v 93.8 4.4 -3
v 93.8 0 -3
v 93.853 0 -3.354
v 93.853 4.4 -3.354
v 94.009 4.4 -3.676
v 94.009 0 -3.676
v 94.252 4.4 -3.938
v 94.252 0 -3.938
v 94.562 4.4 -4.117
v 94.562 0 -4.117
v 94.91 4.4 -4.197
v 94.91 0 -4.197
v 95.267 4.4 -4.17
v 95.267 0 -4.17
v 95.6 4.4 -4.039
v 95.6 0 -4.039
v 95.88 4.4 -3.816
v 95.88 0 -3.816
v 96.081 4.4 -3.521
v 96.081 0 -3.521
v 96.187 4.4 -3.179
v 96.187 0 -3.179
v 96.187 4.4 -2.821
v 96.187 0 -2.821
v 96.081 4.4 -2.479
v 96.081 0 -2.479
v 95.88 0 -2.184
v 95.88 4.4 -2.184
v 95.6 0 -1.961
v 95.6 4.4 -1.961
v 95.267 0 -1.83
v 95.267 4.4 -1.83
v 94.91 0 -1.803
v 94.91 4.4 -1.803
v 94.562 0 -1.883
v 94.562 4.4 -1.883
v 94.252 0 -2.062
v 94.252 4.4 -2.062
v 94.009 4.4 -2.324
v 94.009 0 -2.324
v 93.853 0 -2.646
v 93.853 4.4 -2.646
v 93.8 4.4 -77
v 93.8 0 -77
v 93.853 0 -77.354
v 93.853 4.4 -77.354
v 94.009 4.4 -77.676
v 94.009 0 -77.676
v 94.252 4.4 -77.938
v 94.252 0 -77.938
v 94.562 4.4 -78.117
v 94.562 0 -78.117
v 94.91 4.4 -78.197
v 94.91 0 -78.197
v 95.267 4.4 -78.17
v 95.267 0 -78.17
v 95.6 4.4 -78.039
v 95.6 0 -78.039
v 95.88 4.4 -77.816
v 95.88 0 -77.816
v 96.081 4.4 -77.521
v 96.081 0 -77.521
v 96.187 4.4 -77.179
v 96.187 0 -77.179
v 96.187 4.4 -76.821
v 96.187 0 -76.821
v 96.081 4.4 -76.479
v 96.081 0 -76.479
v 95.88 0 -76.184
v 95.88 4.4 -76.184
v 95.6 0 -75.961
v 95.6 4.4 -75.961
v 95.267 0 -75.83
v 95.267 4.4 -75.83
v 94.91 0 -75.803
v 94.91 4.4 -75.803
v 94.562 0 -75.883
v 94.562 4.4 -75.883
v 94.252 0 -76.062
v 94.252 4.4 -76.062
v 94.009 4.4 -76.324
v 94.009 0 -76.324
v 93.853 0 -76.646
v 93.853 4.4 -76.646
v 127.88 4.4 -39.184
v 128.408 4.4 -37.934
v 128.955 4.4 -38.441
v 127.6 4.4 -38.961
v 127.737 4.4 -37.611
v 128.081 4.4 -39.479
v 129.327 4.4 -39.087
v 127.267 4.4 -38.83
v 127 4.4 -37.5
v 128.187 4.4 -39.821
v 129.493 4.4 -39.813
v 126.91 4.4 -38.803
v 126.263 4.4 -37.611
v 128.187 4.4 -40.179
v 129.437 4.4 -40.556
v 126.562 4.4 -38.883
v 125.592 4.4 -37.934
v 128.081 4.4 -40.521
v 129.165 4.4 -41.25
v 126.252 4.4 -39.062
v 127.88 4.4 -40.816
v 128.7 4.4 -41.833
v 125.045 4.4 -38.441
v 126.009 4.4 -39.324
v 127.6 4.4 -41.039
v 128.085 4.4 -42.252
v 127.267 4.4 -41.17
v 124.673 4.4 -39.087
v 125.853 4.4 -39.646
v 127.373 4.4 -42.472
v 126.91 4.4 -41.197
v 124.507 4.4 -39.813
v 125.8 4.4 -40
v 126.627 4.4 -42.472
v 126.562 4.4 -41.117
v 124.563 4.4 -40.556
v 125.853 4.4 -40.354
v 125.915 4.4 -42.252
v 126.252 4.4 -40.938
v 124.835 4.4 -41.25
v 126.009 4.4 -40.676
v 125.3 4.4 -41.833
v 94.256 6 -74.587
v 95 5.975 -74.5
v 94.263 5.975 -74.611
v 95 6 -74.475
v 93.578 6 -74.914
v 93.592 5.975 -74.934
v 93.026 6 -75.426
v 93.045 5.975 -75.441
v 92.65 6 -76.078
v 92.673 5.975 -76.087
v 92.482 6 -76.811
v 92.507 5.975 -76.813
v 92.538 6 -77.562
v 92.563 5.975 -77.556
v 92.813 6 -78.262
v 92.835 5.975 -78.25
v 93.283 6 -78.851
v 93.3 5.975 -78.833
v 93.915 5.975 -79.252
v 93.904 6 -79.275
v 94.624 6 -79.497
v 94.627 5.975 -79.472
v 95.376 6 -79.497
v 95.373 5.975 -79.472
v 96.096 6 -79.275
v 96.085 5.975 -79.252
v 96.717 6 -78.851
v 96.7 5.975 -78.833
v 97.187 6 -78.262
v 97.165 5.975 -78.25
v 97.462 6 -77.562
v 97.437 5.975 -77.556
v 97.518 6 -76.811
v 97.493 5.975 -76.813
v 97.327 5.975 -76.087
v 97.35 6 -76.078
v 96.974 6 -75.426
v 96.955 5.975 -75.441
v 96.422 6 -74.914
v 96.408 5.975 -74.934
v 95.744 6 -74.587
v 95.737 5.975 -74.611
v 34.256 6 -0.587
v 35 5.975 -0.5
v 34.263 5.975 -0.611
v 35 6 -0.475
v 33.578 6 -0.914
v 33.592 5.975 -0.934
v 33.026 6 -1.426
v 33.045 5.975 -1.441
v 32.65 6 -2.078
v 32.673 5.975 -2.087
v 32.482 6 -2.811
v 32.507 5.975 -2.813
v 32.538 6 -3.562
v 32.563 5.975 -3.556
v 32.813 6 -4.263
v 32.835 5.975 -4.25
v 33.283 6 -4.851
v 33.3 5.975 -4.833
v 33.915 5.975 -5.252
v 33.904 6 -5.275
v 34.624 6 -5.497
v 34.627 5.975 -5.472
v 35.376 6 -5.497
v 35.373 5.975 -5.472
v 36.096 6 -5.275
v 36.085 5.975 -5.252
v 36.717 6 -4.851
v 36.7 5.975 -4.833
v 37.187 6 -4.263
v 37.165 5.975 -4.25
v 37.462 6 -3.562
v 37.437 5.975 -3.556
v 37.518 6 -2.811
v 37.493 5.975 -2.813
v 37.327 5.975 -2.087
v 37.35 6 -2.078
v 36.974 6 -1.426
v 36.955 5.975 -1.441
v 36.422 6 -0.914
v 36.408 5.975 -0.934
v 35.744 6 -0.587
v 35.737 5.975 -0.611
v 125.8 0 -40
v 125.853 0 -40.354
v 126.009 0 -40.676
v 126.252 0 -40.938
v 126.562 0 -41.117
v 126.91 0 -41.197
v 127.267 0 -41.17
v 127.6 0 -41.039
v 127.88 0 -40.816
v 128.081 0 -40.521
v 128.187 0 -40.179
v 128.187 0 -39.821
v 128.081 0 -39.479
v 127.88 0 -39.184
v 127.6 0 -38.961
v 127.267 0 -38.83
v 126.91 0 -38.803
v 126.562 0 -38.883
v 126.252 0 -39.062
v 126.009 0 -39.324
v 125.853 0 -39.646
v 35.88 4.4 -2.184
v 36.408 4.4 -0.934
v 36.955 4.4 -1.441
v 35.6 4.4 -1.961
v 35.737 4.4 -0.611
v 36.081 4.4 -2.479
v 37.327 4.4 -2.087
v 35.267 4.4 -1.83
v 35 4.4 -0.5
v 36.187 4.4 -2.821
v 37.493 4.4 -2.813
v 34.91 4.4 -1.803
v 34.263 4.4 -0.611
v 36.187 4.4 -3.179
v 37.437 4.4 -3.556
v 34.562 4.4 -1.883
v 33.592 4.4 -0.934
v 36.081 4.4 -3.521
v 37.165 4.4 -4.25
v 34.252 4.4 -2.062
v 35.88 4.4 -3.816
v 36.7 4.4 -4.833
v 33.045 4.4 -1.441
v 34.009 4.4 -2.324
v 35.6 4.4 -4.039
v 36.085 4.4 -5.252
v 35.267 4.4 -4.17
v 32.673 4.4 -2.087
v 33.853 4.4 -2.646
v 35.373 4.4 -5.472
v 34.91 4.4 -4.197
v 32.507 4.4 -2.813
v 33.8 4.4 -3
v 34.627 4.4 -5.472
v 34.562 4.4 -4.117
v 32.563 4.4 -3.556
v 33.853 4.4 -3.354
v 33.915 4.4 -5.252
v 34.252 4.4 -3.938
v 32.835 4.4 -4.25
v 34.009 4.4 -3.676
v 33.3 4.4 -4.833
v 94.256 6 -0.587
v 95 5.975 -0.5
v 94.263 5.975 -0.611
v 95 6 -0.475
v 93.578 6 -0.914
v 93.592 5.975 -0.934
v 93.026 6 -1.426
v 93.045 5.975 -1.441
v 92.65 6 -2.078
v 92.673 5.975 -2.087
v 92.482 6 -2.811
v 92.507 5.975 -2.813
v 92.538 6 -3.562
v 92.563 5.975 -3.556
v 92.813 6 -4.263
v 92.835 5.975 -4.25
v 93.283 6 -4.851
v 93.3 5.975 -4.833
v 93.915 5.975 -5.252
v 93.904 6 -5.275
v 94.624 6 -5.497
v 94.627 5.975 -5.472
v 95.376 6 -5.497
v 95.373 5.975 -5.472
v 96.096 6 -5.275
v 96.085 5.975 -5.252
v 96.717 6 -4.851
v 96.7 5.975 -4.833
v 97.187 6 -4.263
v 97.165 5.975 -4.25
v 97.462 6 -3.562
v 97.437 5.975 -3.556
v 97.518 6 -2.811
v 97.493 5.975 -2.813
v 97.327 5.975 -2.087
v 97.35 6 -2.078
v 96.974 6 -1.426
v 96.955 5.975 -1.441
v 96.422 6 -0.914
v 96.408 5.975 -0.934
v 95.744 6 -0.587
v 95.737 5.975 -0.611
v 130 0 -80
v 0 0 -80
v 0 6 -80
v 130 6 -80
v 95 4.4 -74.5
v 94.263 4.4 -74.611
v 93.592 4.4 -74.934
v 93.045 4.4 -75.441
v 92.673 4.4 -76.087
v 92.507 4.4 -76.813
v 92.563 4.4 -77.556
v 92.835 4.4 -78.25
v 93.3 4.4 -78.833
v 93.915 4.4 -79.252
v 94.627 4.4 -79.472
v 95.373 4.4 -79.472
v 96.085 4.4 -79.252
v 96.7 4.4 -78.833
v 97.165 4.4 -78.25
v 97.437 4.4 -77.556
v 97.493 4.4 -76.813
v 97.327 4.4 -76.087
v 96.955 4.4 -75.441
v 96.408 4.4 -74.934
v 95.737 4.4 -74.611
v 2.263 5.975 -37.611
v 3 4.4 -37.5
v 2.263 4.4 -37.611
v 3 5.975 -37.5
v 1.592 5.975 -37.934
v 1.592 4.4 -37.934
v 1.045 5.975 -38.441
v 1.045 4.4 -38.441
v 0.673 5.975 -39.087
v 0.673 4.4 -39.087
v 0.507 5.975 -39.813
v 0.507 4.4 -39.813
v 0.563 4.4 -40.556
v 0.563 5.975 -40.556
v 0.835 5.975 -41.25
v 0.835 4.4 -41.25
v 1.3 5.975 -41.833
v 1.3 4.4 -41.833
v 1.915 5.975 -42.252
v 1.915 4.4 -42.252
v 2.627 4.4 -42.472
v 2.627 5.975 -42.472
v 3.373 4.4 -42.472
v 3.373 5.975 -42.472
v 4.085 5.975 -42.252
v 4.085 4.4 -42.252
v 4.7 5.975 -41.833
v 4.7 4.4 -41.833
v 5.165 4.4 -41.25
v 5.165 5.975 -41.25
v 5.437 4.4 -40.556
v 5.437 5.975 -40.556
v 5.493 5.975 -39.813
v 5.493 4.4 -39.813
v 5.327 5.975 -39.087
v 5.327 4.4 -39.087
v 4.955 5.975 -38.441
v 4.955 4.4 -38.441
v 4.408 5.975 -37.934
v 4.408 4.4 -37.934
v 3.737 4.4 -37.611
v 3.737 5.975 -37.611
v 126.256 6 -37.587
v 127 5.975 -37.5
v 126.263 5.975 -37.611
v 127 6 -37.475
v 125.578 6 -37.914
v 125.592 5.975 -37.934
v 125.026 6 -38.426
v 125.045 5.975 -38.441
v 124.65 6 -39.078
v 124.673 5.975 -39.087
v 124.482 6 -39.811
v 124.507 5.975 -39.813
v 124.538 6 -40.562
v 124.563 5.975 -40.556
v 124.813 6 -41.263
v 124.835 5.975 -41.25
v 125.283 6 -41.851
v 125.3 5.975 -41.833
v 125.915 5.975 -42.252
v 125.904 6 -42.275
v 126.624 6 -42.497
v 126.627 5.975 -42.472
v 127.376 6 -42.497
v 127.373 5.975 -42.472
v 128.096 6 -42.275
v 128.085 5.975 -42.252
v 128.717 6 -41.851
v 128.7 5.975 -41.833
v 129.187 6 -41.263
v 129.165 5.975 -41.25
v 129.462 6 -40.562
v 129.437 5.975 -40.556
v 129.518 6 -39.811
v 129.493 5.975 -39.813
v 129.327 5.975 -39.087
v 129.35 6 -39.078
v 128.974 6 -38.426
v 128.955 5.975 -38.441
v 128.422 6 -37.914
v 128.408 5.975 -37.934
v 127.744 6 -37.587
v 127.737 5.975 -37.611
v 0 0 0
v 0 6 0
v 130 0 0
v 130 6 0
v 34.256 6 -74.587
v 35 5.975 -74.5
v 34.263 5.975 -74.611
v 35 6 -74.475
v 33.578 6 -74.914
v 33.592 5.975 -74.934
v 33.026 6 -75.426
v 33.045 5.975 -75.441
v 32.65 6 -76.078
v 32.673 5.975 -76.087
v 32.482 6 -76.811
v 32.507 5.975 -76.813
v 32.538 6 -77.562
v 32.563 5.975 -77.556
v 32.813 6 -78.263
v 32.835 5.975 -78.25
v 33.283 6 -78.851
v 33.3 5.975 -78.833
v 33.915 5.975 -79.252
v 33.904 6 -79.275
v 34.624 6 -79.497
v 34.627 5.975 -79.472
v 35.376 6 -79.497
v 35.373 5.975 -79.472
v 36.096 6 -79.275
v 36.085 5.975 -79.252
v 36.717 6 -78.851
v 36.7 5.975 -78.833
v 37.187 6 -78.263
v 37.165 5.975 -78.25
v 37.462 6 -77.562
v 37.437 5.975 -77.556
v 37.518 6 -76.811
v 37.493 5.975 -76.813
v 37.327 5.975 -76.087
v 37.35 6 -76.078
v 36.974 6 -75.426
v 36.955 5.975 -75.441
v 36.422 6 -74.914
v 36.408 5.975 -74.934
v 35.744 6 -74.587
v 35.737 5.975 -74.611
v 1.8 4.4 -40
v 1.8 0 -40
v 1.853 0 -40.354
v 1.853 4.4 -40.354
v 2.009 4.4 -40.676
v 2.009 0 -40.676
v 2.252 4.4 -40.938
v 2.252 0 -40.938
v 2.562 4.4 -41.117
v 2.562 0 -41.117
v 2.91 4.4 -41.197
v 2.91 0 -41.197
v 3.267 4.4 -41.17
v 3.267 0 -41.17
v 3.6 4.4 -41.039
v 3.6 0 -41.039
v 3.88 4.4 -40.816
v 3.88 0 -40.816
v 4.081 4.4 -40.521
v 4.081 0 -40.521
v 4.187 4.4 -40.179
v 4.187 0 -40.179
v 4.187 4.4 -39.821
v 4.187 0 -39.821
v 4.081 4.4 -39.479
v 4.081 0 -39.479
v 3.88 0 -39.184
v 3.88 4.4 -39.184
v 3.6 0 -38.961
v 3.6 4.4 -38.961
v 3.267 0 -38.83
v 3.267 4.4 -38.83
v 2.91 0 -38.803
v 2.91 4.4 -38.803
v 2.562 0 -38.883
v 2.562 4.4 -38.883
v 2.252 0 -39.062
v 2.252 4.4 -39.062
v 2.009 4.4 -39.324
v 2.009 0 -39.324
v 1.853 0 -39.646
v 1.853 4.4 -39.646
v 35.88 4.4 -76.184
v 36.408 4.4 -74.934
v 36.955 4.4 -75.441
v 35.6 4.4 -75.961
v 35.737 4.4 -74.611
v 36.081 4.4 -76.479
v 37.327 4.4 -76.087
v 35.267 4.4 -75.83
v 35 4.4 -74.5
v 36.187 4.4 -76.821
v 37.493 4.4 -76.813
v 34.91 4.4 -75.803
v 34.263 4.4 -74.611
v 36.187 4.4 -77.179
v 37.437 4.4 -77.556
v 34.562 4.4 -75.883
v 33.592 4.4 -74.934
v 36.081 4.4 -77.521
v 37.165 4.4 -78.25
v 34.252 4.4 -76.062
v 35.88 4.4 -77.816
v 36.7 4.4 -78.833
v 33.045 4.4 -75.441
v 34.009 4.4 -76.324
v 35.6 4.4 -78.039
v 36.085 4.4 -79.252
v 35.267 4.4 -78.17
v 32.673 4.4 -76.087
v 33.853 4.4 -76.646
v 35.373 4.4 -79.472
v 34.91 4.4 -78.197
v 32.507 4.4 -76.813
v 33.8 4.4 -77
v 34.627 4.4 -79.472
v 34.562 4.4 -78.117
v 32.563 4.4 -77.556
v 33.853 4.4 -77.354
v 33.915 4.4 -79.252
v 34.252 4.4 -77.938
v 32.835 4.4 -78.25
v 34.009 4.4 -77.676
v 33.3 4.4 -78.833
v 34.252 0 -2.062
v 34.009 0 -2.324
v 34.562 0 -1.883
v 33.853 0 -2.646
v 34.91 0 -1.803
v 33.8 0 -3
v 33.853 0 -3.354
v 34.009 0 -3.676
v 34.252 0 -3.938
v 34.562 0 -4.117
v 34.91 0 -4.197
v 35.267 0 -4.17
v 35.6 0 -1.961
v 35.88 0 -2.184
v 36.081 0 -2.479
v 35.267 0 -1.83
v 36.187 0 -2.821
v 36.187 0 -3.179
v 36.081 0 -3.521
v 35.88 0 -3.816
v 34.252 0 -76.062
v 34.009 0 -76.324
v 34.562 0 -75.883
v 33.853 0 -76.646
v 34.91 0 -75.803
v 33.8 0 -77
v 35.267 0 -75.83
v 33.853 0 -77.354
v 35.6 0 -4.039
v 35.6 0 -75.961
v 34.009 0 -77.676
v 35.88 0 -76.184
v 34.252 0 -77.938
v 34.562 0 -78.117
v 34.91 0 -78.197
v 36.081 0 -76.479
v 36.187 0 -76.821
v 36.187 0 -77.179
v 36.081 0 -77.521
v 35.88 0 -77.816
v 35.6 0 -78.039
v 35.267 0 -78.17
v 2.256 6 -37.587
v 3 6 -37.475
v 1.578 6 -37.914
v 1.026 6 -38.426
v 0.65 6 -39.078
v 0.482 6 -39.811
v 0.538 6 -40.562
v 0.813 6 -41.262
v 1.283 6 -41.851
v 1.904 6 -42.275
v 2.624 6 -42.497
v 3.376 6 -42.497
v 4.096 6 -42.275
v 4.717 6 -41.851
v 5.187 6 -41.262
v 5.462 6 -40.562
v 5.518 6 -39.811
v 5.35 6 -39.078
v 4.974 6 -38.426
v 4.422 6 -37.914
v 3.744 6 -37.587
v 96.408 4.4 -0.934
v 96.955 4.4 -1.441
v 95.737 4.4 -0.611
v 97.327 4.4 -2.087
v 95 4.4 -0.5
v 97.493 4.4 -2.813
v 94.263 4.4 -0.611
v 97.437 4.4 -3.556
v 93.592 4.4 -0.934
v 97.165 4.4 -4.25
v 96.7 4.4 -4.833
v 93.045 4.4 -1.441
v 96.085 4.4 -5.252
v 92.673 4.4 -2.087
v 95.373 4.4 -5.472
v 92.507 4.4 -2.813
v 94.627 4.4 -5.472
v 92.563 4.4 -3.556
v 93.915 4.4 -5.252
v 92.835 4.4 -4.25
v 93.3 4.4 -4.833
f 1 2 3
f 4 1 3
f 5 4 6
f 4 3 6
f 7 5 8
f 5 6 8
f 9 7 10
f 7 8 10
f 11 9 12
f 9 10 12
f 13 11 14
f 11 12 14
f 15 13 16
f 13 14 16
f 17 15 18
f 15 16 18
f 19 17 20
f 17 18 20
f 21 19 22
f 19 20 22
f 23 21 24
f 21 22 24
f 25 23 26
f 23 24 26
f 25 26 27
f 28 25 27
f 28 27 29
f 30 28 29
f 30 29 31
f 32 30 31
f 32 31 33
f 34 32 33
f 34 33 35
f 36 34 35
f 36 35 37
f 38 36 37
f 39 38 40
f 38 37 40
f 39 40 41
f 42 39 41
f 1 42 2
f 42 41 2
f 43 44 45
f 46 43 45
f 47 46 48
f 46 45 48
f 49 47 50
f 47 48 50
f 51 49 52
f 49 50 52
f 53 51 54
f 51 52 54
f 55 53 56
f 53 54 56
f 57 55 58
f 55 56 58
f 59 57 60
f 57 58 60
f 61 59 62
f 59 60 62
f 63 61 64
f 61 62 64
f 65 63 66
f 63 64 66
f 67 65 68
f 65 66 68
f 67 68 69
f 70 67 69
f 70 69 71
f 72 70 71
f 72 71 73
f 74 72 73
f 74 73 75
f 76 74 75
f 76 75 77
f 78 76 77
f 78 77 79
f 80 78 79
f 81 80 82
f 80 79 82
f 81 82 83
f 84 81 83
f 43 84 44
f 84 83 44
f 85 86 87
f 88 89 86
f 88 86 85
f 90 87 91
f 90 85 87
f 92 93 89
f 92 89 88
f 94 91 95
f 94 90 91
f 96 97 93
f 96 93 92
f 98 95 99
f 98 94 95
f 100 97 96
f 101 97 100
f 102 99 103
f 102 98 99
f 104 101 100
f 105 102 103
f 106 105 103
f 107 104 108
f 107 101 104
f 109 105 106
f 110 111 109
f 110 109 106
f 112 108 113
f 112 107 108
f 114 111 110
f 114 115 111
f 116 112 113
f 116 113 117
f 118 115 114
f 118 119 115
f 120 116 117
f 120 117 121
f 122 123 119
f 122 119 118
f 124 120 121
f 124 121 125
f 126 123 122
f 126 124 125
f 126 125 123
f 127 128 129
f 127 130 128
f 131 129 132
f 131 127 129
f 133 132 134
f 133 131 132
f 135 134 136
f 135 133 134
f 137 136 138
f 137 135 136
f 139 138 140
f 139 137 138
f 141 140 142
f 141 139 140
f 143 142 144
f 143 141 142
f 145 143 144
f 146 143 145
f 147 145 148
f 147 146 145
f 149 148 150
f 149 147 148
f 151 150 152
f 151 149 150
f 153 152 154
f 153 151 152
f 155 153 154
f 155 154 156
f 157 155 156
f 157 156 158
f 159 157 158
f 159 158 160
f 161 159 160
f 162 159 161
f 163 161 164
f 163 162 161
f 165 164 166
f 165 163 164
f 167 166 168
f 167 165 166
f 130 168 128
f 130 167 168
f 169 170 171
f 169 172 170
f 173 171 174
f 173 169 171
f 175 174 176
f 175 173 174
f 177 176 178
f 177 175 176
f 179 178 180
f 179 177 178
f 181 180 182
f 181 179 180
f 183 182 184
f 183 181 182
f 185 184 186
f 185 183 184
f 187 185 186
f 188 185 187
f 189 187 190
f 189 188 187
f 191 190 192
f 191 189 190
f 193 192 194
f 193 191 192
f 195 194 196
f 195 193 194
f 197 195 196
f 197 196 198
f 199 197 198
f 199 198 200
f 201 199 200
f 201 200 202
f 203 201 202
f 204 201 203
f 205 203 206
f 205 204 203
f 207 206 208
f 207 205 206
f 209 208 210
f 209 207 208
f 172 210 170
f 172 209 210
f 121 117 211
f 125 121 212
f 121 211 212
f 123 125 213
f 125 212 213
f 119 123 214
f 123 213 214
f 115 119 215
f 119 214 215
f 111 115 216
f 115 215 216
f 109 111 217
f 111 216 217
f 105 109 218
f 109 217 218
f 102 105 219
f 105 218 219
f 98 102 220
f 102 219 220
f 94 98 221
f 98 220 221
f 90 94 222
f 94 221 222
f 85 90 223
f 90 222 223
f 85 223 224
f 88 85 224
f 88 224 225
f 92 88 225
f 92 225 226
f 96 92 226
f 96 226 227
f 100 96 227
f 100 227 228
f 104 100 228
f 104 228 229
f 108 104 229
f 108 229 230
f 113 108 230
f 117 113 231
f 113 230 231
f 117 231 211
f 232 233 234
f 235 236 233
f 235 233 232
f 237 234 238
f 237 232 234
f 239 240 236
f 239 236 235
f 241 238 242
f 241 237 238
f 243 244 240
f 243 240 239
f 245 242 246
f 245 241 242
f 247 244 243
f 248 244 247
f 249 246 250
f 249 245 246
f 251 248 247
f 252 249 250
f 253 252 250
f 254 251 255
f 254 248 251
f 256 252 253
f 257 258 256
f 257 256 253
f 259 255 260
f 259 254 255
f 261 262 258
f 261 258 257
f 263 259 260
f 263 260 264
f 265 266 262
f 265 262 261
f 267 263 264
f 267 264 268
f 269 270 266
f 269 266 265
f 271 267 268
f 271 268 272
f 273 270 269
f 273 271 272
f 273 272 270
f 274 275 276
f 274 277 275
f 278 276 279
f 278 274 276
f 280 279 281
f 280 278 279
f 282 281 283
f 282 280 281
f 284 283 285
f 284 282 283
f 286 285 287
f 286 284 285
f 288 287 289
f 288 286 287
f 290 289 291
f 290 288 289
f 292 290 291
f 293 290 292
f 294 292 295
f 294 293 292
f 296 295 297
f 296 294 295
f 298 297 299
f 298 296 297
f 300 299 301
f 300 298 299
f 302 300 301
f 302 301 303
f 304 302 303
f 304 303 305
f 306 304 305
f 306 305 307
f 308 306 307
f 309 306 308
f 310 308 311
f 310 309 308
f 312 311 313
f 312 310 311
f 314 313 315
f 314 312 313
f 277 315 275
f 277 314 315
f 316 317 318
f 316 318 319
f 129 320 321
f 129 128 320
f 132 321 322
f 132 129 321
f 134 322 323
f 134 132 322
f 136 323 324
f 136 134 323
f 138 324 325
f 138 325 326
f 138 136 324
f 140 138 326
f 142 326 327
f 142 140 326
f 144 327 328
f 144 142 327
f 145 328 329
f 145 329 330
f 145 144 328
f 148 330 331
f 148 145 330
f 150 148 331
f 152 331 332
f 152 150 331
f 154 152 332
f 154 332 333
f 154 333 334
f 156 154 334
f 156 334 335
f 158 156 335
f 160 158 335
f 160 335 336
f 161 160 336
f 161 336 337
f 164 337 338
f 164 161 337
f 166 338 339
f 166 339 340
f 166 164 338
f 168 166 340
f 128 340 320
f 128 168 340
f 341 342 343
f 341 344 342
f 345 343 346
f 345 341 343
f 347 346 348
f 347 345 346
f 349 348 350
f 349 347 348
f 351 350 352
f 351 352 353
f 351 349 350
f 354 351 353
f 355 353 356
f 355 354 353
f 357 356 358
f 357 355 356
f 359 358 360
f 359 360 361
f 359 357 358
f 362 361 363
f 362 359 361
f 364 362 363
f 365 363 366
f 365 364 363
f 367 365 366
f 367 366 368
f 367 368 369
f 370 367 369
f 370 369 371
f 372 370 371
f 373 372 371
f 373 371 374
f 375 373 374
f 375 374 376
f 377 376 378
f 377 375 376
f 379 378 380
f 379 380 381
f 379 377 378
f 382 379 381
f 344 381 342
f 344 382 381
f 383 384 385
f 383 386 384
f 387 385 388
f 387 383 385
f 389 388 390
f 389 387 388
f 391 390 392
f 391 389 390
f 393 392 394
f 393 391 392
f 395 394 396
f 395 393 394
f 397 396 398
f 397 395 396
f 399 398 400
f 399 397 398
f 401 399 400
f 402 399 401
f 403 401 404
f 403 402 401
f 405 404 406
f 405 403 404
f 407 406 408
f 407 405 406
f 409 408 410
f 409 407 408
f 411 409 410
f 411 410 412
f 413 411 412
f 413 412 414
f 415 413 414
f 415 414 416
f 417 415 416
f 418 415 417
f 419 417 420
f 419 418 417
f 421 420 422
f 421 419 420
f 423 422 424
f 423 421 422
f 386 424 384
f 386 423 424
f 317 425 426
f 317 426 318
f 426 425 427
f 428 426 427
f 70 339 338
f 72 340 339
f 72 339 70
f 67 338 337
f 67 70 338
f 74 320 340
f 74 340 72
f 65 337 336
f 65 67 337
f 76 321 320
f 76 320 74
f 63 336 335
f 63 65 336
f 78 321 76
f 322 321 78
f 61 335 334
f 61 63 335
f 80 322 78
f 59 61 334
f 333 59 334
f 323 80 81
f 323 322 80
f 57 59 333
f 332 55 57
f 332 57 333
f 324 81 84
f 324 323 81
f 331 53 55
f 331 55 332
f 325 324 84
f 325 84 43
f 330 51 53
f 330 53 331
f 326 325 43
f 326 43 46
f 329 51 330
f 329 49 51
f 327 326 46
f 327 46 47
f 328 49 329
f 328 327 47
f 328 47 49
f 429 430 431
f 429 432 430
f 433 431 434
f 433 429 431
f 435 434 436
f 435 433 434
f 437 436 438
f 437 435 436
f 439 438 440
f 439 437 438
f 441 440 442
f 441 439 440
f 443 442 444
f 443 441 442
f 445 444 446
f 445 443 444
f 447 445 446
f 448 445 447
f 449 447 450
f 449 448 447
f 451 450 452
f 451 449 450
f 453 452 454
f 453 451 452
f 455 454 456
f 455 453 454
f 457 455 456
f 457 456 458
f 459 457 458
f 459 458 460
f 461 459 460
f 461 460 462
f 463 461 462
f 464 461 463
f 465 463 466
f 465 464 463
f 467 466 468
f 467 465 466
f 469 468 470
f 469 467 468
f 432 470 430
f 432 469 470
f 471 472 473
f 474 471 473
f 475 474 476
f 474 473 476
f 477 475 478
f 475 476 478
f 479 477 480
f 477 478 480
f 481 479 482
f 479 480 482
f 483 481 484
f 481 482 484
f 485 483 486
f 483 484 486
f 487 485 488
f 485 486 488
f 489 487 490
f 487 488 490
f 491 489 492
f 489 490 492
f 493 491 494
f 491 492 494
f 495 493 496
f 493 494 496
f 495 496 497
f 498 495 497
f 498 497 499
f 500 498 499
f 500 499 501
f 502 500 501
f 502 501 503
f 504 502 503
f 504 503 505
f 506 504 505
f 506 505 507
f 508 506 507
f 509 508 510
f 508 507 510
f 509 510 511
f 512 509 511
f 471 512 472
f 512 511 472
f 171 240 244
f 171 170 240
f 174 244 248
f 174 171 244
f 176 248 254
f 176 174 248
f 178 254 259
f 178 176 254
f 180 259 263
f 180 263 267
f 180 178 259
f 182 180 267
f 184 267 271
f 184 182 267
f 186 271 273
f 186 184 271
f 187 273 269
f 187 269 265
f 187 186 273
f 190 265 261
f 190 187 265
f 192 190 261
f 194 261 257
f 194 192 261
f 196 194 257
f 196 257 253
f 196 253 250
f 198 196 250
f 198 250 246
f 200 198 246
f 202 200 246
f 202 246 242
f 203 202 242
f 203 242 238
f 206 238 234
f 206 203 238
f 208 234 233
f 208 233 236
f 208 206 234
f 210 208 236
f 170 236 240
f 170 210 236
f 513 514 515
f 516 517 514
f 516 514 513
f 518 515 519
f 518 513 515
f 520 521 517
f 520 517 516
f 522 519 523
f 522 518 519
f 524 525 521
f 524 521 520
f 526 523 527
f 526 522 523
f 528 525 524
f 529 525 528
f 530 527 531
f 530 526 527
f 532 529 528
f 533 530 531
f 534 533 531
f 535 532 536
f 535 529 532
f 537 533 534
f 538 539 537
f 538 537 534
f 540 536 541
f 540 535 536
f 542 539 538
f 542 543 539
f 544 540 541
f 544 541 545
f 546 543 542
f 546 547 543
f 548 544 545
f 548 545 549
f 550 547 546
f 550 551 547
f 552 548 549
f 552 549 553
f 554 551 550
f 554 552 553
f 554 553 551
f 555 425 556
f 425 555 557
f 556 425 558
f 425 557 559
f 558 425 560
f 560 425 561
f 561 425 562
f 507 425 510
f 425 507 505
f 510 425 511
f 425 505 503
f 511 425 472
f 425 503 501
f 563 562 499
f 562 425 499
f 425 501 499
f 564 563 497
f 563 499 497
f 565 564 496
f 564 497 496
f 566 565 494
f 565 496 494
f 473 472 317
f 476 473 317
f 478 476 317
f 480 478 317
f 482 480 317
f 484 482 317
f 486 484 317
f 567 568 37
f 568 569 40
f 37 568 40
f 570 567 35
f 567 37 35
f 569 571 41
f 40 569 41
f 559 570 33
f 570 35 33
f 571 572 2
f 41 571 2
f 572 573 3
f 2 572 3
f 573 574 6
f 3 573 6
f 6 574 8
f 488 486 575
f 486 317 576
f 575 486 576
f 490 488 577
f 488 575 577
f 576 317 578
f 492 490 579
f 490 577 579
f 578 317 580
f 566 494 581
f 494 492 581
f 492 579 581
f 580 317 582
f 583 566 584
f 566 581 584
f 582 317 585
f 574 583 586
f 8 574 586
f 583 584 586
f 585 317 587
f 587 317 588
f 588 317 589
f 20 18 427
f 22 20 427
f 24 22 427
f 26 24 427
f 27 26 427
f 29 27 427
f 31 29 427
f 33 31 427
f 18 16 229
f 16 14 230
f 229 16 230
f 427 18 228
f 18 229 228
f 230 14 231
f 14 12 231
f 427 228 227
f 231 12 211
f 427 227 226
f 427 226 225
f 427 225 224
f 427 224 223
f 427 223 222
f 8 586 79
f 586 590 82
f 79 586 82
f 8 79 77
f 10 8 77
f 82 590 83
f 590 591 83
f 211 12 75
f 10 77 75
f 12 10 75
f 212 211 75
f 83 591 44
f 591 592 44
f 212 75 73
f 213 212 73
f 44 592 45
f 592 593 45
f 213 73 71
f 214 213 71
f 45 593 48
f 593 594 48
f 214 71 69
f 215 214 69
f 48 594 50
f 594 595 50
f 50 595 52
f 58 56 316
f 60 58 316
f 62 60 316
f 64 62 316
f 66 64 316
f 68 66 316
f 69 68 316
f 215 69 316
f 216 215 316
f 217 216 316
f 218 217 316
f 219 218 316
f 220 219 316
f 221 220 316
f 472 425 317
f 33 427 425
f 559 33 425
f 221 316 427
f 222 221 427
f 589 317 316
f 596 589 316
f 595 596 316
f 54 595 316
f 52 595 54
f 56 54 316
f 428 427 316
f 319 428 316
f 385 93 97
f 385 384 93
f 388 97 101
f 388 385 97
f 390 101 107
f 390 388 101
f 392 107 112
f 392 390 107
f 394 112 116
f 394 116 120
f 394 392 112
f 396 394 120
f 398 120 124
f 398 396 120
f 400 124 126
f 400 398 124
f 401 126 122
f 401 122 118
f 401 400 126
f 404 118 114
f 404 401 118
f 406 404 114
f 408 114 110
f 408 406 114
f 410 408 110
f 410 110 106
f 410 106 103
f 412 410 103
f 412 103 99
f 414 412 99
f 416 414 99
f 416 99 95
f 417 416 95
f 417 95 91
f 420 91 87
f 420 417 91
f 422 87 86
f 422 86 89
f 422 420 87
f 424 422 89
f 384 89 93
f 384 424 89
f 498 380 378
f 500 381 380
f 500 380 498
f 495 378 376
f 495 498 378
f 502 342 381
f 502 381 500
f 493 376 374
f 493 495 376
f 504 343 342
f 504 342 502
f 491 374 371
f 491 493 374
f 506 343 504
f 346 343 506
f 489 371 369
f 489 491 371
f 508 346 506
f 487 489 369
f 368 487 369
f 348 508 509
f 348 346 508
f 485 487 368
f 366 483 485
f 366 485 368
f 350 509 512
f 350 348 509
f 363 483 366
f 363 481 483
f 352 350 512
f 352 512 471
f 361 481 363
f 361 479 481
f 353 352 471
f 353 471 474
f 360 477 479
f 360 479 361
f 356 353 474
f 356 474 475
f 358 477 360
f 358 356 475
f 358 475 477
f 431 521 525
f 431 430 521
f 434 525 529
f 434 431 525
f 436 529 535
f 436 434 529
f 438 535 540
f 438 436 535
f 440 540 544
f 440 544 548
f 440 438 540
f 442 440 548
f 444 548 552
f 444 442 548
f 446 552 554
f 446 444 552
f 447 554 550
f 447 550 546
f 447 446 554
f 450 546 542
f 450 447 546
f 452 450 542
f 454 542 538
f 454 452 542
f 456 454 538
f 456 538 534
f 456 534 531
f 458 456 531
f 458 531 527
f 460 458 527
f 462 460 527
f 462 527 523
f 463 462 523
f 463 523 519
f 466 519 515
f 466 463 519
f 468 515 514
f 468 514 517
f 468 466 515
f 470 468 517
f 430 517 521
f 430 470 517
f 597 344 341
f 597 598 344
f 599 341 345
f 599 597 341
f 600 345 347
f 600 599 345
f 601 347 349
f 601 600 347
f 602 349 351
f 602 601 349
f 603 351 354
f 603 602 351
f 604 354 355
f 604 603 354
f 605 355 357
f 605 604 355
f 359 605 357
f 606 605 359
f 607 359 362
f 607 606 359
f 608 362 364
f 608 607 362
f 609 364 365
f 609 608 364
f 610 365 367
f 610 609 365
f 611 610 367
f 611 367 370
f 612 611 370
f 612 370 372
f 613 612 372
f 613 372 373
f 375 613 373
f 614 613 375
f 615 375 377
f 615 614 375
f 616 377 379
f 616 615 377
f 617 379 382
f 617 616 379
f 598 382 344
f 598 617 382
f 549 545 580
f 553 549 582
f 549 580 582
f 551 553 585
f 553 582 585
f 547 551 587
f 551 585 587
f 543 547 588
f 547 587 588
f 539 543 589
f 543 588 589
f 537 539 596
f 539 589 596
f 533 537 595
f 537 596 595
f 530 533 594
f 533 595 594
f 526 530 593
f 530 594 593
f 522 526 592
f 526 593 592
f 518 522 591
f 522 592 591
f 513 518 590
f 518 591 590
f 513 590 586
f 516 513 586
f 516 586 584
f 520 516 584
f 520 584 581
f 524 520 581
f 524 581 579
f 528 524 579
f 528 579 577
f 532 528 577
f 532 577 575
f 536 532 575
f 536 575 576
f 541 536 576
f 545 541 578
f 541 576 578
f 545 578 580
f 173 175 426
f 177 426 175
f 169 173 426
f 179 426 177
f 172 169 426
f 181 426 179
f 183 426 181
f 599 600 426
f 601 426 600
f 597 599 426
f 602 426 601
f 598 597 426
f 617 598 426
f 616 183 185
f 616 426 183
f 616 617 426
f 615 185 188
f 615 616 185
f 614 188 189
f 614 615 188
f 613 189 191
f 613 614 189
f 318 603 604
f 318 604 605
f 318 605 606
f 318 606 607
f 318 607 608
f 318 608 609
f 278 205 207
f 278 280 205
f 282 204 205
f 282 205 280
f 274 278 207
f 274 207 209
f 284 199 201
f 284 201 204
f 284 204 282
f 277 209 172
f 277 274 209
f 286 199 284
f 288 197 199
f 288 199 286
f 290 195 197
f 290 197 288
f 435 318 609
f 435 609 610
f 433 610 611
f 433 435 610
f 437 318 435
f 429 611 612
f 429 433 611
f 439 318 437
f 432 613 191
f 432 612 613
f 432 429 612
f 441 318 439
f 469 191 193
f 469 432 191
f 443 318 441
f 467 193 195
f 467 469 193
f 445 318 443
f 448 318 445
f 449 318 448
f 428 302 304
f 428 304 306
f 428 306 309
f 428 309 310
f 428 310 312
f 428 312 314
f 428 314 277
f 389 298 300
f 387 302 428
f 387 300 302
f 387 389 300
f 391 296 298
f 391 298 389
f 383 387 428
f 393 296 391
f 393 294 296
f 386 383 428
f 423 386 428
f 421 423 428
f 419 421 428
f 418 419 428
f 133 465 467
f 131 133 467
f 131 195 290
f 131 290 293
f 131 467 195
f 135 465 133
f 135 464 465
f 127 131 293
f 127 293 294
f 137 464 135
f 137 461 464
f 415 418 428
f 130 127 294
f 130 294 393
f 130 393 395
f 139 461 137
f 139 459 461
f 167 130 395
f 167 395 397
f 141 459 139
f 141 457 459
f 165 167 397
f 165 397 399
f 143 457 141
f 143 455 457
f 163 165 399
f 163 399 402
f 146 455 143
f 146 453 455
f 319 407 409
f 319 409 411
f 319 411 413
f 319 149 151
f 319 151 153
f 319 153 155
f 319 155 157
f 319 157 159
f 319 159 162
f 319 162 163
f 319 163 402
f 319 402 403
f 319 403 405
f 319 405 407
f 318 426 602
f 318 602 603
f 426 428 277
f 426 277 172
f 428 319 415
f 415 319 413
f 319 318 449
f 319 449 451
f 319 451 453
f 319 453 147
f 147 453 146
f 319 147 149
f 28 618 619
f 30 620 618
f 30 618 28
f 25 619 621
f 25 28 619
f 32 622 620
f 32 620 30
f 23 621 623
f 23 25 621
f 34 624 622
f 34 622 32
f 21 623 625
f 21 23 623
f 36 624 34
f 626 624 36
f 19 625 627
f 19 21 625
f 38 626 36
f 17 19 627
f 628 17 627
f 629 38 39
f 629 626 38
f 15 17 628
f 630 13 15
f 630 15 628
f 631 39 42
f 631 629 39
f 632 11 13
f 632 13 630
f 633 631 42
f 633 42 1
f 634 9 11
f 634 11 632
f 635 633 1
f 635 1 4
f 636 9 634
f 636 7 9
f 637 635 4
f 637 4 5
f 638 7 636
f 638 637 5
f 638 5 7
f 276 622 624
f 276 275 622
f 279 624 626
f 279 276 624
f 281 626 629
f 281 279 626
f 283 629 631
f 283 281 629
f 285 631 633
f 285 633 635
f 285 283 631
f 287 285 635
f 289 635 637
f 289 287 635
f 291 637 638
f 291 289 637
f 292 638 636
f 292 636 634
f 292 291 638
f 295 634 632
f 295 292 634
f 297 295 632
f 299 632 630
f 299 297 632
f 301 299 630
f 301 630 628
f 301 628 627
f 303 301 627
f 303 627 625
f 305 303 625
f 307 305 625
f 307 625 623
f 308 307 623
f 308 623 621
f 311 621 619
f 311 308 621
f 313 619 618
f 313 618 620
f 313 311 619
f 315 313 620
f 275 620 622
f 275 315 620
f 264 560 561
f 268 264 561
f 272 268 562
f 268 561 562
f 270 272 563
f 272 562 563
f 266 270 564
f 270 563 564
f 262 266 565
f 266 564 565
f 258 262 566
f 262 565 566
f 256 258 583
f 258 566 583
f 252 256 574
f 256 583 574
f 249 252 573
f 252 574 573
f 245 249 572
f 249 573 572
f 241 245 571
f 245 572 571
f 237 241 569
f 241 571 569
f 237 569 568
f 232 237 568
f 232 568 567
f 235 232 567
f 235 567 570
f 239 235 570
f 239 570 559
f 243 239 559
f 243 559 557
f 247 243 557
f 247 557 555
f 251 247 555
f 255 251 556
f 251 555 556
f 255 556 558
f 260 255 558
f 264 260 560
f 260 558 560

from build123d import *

# Parameters (mm, degrees)
SKIZZE1_W                                    = 130
SKIZZE1_H                                    = 80
AUFSATZ_LINEAR_AUSTRAGEN1_DEPTH              = 6
F_2_4_2_4_DURCHMESSER_BOHRUNG1_D             = 2.4
F_2_4_2_4_DURCHMESSER_BOHRUNG1_DEPTH         = 10
F_2_4_2_4_DURCHMESSER_BOHRUNG1_CSINK_D       = 2.45
F_2_4_2_4_DURCHMESSER_BOHRUNG1_CSINK_ANGLE   = 90
F_2_4_2_4_DURCHMESSER_BOHRUNG1_TIP           = 0.721032743
STIRNSENKUNG_F_R_M2_FLACHKOPFSCHRAUB_2_COUNT = 2
STIRNSENKUNG_F_R_M2_FLACHKOPFSCHRAUB_2_PITCH = 48.918299235
STIRNSENKUNG_F_R_M2_FLACHKOPFSCHRAUB_3_COUNT = 2
STIRNSENKUNG_F_R_M2_FLACHKOPFSCHRAUB_3_PITCH = 74
STIRNSENKUNG_F_R_M2_FLACHKOPFSCHRAUB_4_COUNT = 2
STIRNSENKUNG_F_R_M2_FLACHKOPFSCHRAUB_4_PITCH = 95.268042911
STIRNSENKUNG_F_R_M2_FLACHKOPFSCHRAUB_5_COUNT = 2
STIRNSENKUNG_F_R_M2_FLACHKOPFSCHRAUB_5_PITCH = 99.161484458
STIRNSENKUNG_F_R_M2_FLACHKOPFSCHRAUB_6_COUNT = 2
STIRNSENKUNG_F_R_M2_FLACHKOPFSCHRAUB_6_PITCH = 60


with BuildPart() as part:
    # Skizze1 → Aufsatz-Linear austragen1 (new body)
    with BuildSketch(Plane(origin=(0, 0, 0), x_dir=(1, 0, 0), z_dir=(0, 1, 0))):
        with Locations((65, 40)):
            Rectangle(SKIZZE1_W, SKIZZE1_H)
    extrude(amount=AUFSATZ_LINEAR_AUSTRAGEN1_DEPTH)

    # Ø2.4 (2.4) Durchmesser Bohrung1
    with Locations(Plane(origin=(0, 6, 0), x_dir=(1, 0, 0), z_dir=(0, 1, 0))):
        with Locations((35, 77), (95, 77), (127, 40), (95, 3), (35, 3), (3, 40), (133.088689194, 32.803420387)):
            CounterSinkHole(F_2_4_2_4_DURCHMESSER_BOHRUNG1_D / 2, F_2_4_2_4_DURCHMESSER_BOHRUNG1_CSINK_D / 2, depth=F_2_4_2_4_DURCHMESSER_BOHRUNG1_DEPTH, counter_sink_angle=F_2_4_2_4_DURCHMESSER_BOHRUNG1_CSINK_ANGLE)
            with Locations((0, 0, -(F_2_4_2_4_DURCHMESSER_BOHRUNG1_DEPTH + F_2_4_2_4_DURCHMESSER_BOHRUNG1_TIP / 2))):  # 118° drill point
                Cone(0, F_2_4_2_4_DURCHMESSER_BOHRUNG1_D / 2, F_2_4_2_4_DURCHMESSER_BOHRUNG1_TIP, mode=Mode.SUBTRACT)

    # Skizze7 → Stirnsenkung für M2 Flachkopfschraube mit Schlitz1 (revolve, cut)
    with BuildSketch(Plane(origin=(95, 6, -3), x_dir=(0, 0, 1), z_dir=(1, 0, 0))):
        Polygon((0, 0), (0, 2.721032743), (1.2, 2), (1.2, 1.6), (2.5, 1.6), (2.5, 0.025), (2.525, 0), align=None)
    stirnsenkung_f_r_m2_flachkopfschraube_mi = revolve(axis=Axis((95, 12.35, -3), (0, -1, 0)), mode=Mode.SUBTRACT)

    # Stirnsenkung f_r M2 Flachkopfschraub 2: Stirnsenkung für M2 Flachkopfschraube mit Schlitz1 ×2
    with Locations(*[Vector(0.6541519329315842, 0, -0.7563631724521444) * (i * STIRNSENKUNG_F_R_M2_FLACHKOPFSCHRAUB_2_PITCH) for i in range(1, STIRNSENKUNG_F_R_M2_FLACHKOPFSCHRAUB_2_COUNT)]):
        add(stirnsenkung_f_r_m2_flachkopfschraube_mi, mode=Mode.SUBTRACT)

    # Stirnsenkung f_r M2 Flachkopfschraub 3: Stirnsenkung für M2 Flachkopfschraube mit Schlitz1 ×2
    with Locations(*[(0, 0, -i * STIRNSENKUNG_F_R_M2_FLACHKOPFSCHRAUB_3_PITCH) for i in range(1, STIRNSENKUNG_F_R_M2_FLACHKOPFSCHRAUB_3_COUNT)]):
        add(stirnsenkung_f_r_m2_flachkopfschraube_mi, mode=Mode.SUBTRACT)

    # Stirnsenkung f_r M2 Flachkopfschraub 4: Stirnsenkung für M2 Flachkopfschraube mit Schlitz1 ×2
    with Locations(*[Vector(-0.6298019584212194, 0, -0.7767557487195037) * (i * STIRNSENKUNG_F_R_M2_FLACHKOPFSCHRAUB_4_PITCH) for i in range(1, STIRNSENKUNG_F_R_M2_FLACHKOPFSCHRAUB_4_COUNT)]):
        add(stirnsenkung_f_r_m2_flachkopfschraube_mi, mode=Mode.SUBTRACT)

    # Stirnsenkung f_r M2 Flachkopfschraub 5: Stirnsenkung für M2 Flachkopfschraube mit Schlitz1 ×2
    with Locations(*[Vector(-0.9277795759357077, 0, -0.37312874249588235) * (i * STIRNSENKUNG_F_R_M2_FLACHKOPFSCHRAUB_5_PITCH) for i in range(1, STIRNSENKUNG_F_R_M2_FLACHKOPFSCHRAUB_5_COUNT)]):
        add(stirnsenkung_f_r_m2_flachkopfschraube_mi, mode=Mode.SUBTRACT)

    # Stirnsenkung f_r M2 Flachkopfschraub 6: Stirnsenkung für M2 Flachkopfschraube mit Schlitz1 ×2
    with Locations(*[(-i * STIRNSENKUNG_F_R_M2_FLACHKOPFSCHRAUB_6_PITCH, 0, 0) for i in range(1, STIRNSENKUNG_F_R_M2_FLACHKOPFSCHRAUB_6_COUNT)]):
        add(stirnsenkung_f_r_m2_flachkopfschraube_mi, mode=Mode.SUBTRACT)


solid = part.part
